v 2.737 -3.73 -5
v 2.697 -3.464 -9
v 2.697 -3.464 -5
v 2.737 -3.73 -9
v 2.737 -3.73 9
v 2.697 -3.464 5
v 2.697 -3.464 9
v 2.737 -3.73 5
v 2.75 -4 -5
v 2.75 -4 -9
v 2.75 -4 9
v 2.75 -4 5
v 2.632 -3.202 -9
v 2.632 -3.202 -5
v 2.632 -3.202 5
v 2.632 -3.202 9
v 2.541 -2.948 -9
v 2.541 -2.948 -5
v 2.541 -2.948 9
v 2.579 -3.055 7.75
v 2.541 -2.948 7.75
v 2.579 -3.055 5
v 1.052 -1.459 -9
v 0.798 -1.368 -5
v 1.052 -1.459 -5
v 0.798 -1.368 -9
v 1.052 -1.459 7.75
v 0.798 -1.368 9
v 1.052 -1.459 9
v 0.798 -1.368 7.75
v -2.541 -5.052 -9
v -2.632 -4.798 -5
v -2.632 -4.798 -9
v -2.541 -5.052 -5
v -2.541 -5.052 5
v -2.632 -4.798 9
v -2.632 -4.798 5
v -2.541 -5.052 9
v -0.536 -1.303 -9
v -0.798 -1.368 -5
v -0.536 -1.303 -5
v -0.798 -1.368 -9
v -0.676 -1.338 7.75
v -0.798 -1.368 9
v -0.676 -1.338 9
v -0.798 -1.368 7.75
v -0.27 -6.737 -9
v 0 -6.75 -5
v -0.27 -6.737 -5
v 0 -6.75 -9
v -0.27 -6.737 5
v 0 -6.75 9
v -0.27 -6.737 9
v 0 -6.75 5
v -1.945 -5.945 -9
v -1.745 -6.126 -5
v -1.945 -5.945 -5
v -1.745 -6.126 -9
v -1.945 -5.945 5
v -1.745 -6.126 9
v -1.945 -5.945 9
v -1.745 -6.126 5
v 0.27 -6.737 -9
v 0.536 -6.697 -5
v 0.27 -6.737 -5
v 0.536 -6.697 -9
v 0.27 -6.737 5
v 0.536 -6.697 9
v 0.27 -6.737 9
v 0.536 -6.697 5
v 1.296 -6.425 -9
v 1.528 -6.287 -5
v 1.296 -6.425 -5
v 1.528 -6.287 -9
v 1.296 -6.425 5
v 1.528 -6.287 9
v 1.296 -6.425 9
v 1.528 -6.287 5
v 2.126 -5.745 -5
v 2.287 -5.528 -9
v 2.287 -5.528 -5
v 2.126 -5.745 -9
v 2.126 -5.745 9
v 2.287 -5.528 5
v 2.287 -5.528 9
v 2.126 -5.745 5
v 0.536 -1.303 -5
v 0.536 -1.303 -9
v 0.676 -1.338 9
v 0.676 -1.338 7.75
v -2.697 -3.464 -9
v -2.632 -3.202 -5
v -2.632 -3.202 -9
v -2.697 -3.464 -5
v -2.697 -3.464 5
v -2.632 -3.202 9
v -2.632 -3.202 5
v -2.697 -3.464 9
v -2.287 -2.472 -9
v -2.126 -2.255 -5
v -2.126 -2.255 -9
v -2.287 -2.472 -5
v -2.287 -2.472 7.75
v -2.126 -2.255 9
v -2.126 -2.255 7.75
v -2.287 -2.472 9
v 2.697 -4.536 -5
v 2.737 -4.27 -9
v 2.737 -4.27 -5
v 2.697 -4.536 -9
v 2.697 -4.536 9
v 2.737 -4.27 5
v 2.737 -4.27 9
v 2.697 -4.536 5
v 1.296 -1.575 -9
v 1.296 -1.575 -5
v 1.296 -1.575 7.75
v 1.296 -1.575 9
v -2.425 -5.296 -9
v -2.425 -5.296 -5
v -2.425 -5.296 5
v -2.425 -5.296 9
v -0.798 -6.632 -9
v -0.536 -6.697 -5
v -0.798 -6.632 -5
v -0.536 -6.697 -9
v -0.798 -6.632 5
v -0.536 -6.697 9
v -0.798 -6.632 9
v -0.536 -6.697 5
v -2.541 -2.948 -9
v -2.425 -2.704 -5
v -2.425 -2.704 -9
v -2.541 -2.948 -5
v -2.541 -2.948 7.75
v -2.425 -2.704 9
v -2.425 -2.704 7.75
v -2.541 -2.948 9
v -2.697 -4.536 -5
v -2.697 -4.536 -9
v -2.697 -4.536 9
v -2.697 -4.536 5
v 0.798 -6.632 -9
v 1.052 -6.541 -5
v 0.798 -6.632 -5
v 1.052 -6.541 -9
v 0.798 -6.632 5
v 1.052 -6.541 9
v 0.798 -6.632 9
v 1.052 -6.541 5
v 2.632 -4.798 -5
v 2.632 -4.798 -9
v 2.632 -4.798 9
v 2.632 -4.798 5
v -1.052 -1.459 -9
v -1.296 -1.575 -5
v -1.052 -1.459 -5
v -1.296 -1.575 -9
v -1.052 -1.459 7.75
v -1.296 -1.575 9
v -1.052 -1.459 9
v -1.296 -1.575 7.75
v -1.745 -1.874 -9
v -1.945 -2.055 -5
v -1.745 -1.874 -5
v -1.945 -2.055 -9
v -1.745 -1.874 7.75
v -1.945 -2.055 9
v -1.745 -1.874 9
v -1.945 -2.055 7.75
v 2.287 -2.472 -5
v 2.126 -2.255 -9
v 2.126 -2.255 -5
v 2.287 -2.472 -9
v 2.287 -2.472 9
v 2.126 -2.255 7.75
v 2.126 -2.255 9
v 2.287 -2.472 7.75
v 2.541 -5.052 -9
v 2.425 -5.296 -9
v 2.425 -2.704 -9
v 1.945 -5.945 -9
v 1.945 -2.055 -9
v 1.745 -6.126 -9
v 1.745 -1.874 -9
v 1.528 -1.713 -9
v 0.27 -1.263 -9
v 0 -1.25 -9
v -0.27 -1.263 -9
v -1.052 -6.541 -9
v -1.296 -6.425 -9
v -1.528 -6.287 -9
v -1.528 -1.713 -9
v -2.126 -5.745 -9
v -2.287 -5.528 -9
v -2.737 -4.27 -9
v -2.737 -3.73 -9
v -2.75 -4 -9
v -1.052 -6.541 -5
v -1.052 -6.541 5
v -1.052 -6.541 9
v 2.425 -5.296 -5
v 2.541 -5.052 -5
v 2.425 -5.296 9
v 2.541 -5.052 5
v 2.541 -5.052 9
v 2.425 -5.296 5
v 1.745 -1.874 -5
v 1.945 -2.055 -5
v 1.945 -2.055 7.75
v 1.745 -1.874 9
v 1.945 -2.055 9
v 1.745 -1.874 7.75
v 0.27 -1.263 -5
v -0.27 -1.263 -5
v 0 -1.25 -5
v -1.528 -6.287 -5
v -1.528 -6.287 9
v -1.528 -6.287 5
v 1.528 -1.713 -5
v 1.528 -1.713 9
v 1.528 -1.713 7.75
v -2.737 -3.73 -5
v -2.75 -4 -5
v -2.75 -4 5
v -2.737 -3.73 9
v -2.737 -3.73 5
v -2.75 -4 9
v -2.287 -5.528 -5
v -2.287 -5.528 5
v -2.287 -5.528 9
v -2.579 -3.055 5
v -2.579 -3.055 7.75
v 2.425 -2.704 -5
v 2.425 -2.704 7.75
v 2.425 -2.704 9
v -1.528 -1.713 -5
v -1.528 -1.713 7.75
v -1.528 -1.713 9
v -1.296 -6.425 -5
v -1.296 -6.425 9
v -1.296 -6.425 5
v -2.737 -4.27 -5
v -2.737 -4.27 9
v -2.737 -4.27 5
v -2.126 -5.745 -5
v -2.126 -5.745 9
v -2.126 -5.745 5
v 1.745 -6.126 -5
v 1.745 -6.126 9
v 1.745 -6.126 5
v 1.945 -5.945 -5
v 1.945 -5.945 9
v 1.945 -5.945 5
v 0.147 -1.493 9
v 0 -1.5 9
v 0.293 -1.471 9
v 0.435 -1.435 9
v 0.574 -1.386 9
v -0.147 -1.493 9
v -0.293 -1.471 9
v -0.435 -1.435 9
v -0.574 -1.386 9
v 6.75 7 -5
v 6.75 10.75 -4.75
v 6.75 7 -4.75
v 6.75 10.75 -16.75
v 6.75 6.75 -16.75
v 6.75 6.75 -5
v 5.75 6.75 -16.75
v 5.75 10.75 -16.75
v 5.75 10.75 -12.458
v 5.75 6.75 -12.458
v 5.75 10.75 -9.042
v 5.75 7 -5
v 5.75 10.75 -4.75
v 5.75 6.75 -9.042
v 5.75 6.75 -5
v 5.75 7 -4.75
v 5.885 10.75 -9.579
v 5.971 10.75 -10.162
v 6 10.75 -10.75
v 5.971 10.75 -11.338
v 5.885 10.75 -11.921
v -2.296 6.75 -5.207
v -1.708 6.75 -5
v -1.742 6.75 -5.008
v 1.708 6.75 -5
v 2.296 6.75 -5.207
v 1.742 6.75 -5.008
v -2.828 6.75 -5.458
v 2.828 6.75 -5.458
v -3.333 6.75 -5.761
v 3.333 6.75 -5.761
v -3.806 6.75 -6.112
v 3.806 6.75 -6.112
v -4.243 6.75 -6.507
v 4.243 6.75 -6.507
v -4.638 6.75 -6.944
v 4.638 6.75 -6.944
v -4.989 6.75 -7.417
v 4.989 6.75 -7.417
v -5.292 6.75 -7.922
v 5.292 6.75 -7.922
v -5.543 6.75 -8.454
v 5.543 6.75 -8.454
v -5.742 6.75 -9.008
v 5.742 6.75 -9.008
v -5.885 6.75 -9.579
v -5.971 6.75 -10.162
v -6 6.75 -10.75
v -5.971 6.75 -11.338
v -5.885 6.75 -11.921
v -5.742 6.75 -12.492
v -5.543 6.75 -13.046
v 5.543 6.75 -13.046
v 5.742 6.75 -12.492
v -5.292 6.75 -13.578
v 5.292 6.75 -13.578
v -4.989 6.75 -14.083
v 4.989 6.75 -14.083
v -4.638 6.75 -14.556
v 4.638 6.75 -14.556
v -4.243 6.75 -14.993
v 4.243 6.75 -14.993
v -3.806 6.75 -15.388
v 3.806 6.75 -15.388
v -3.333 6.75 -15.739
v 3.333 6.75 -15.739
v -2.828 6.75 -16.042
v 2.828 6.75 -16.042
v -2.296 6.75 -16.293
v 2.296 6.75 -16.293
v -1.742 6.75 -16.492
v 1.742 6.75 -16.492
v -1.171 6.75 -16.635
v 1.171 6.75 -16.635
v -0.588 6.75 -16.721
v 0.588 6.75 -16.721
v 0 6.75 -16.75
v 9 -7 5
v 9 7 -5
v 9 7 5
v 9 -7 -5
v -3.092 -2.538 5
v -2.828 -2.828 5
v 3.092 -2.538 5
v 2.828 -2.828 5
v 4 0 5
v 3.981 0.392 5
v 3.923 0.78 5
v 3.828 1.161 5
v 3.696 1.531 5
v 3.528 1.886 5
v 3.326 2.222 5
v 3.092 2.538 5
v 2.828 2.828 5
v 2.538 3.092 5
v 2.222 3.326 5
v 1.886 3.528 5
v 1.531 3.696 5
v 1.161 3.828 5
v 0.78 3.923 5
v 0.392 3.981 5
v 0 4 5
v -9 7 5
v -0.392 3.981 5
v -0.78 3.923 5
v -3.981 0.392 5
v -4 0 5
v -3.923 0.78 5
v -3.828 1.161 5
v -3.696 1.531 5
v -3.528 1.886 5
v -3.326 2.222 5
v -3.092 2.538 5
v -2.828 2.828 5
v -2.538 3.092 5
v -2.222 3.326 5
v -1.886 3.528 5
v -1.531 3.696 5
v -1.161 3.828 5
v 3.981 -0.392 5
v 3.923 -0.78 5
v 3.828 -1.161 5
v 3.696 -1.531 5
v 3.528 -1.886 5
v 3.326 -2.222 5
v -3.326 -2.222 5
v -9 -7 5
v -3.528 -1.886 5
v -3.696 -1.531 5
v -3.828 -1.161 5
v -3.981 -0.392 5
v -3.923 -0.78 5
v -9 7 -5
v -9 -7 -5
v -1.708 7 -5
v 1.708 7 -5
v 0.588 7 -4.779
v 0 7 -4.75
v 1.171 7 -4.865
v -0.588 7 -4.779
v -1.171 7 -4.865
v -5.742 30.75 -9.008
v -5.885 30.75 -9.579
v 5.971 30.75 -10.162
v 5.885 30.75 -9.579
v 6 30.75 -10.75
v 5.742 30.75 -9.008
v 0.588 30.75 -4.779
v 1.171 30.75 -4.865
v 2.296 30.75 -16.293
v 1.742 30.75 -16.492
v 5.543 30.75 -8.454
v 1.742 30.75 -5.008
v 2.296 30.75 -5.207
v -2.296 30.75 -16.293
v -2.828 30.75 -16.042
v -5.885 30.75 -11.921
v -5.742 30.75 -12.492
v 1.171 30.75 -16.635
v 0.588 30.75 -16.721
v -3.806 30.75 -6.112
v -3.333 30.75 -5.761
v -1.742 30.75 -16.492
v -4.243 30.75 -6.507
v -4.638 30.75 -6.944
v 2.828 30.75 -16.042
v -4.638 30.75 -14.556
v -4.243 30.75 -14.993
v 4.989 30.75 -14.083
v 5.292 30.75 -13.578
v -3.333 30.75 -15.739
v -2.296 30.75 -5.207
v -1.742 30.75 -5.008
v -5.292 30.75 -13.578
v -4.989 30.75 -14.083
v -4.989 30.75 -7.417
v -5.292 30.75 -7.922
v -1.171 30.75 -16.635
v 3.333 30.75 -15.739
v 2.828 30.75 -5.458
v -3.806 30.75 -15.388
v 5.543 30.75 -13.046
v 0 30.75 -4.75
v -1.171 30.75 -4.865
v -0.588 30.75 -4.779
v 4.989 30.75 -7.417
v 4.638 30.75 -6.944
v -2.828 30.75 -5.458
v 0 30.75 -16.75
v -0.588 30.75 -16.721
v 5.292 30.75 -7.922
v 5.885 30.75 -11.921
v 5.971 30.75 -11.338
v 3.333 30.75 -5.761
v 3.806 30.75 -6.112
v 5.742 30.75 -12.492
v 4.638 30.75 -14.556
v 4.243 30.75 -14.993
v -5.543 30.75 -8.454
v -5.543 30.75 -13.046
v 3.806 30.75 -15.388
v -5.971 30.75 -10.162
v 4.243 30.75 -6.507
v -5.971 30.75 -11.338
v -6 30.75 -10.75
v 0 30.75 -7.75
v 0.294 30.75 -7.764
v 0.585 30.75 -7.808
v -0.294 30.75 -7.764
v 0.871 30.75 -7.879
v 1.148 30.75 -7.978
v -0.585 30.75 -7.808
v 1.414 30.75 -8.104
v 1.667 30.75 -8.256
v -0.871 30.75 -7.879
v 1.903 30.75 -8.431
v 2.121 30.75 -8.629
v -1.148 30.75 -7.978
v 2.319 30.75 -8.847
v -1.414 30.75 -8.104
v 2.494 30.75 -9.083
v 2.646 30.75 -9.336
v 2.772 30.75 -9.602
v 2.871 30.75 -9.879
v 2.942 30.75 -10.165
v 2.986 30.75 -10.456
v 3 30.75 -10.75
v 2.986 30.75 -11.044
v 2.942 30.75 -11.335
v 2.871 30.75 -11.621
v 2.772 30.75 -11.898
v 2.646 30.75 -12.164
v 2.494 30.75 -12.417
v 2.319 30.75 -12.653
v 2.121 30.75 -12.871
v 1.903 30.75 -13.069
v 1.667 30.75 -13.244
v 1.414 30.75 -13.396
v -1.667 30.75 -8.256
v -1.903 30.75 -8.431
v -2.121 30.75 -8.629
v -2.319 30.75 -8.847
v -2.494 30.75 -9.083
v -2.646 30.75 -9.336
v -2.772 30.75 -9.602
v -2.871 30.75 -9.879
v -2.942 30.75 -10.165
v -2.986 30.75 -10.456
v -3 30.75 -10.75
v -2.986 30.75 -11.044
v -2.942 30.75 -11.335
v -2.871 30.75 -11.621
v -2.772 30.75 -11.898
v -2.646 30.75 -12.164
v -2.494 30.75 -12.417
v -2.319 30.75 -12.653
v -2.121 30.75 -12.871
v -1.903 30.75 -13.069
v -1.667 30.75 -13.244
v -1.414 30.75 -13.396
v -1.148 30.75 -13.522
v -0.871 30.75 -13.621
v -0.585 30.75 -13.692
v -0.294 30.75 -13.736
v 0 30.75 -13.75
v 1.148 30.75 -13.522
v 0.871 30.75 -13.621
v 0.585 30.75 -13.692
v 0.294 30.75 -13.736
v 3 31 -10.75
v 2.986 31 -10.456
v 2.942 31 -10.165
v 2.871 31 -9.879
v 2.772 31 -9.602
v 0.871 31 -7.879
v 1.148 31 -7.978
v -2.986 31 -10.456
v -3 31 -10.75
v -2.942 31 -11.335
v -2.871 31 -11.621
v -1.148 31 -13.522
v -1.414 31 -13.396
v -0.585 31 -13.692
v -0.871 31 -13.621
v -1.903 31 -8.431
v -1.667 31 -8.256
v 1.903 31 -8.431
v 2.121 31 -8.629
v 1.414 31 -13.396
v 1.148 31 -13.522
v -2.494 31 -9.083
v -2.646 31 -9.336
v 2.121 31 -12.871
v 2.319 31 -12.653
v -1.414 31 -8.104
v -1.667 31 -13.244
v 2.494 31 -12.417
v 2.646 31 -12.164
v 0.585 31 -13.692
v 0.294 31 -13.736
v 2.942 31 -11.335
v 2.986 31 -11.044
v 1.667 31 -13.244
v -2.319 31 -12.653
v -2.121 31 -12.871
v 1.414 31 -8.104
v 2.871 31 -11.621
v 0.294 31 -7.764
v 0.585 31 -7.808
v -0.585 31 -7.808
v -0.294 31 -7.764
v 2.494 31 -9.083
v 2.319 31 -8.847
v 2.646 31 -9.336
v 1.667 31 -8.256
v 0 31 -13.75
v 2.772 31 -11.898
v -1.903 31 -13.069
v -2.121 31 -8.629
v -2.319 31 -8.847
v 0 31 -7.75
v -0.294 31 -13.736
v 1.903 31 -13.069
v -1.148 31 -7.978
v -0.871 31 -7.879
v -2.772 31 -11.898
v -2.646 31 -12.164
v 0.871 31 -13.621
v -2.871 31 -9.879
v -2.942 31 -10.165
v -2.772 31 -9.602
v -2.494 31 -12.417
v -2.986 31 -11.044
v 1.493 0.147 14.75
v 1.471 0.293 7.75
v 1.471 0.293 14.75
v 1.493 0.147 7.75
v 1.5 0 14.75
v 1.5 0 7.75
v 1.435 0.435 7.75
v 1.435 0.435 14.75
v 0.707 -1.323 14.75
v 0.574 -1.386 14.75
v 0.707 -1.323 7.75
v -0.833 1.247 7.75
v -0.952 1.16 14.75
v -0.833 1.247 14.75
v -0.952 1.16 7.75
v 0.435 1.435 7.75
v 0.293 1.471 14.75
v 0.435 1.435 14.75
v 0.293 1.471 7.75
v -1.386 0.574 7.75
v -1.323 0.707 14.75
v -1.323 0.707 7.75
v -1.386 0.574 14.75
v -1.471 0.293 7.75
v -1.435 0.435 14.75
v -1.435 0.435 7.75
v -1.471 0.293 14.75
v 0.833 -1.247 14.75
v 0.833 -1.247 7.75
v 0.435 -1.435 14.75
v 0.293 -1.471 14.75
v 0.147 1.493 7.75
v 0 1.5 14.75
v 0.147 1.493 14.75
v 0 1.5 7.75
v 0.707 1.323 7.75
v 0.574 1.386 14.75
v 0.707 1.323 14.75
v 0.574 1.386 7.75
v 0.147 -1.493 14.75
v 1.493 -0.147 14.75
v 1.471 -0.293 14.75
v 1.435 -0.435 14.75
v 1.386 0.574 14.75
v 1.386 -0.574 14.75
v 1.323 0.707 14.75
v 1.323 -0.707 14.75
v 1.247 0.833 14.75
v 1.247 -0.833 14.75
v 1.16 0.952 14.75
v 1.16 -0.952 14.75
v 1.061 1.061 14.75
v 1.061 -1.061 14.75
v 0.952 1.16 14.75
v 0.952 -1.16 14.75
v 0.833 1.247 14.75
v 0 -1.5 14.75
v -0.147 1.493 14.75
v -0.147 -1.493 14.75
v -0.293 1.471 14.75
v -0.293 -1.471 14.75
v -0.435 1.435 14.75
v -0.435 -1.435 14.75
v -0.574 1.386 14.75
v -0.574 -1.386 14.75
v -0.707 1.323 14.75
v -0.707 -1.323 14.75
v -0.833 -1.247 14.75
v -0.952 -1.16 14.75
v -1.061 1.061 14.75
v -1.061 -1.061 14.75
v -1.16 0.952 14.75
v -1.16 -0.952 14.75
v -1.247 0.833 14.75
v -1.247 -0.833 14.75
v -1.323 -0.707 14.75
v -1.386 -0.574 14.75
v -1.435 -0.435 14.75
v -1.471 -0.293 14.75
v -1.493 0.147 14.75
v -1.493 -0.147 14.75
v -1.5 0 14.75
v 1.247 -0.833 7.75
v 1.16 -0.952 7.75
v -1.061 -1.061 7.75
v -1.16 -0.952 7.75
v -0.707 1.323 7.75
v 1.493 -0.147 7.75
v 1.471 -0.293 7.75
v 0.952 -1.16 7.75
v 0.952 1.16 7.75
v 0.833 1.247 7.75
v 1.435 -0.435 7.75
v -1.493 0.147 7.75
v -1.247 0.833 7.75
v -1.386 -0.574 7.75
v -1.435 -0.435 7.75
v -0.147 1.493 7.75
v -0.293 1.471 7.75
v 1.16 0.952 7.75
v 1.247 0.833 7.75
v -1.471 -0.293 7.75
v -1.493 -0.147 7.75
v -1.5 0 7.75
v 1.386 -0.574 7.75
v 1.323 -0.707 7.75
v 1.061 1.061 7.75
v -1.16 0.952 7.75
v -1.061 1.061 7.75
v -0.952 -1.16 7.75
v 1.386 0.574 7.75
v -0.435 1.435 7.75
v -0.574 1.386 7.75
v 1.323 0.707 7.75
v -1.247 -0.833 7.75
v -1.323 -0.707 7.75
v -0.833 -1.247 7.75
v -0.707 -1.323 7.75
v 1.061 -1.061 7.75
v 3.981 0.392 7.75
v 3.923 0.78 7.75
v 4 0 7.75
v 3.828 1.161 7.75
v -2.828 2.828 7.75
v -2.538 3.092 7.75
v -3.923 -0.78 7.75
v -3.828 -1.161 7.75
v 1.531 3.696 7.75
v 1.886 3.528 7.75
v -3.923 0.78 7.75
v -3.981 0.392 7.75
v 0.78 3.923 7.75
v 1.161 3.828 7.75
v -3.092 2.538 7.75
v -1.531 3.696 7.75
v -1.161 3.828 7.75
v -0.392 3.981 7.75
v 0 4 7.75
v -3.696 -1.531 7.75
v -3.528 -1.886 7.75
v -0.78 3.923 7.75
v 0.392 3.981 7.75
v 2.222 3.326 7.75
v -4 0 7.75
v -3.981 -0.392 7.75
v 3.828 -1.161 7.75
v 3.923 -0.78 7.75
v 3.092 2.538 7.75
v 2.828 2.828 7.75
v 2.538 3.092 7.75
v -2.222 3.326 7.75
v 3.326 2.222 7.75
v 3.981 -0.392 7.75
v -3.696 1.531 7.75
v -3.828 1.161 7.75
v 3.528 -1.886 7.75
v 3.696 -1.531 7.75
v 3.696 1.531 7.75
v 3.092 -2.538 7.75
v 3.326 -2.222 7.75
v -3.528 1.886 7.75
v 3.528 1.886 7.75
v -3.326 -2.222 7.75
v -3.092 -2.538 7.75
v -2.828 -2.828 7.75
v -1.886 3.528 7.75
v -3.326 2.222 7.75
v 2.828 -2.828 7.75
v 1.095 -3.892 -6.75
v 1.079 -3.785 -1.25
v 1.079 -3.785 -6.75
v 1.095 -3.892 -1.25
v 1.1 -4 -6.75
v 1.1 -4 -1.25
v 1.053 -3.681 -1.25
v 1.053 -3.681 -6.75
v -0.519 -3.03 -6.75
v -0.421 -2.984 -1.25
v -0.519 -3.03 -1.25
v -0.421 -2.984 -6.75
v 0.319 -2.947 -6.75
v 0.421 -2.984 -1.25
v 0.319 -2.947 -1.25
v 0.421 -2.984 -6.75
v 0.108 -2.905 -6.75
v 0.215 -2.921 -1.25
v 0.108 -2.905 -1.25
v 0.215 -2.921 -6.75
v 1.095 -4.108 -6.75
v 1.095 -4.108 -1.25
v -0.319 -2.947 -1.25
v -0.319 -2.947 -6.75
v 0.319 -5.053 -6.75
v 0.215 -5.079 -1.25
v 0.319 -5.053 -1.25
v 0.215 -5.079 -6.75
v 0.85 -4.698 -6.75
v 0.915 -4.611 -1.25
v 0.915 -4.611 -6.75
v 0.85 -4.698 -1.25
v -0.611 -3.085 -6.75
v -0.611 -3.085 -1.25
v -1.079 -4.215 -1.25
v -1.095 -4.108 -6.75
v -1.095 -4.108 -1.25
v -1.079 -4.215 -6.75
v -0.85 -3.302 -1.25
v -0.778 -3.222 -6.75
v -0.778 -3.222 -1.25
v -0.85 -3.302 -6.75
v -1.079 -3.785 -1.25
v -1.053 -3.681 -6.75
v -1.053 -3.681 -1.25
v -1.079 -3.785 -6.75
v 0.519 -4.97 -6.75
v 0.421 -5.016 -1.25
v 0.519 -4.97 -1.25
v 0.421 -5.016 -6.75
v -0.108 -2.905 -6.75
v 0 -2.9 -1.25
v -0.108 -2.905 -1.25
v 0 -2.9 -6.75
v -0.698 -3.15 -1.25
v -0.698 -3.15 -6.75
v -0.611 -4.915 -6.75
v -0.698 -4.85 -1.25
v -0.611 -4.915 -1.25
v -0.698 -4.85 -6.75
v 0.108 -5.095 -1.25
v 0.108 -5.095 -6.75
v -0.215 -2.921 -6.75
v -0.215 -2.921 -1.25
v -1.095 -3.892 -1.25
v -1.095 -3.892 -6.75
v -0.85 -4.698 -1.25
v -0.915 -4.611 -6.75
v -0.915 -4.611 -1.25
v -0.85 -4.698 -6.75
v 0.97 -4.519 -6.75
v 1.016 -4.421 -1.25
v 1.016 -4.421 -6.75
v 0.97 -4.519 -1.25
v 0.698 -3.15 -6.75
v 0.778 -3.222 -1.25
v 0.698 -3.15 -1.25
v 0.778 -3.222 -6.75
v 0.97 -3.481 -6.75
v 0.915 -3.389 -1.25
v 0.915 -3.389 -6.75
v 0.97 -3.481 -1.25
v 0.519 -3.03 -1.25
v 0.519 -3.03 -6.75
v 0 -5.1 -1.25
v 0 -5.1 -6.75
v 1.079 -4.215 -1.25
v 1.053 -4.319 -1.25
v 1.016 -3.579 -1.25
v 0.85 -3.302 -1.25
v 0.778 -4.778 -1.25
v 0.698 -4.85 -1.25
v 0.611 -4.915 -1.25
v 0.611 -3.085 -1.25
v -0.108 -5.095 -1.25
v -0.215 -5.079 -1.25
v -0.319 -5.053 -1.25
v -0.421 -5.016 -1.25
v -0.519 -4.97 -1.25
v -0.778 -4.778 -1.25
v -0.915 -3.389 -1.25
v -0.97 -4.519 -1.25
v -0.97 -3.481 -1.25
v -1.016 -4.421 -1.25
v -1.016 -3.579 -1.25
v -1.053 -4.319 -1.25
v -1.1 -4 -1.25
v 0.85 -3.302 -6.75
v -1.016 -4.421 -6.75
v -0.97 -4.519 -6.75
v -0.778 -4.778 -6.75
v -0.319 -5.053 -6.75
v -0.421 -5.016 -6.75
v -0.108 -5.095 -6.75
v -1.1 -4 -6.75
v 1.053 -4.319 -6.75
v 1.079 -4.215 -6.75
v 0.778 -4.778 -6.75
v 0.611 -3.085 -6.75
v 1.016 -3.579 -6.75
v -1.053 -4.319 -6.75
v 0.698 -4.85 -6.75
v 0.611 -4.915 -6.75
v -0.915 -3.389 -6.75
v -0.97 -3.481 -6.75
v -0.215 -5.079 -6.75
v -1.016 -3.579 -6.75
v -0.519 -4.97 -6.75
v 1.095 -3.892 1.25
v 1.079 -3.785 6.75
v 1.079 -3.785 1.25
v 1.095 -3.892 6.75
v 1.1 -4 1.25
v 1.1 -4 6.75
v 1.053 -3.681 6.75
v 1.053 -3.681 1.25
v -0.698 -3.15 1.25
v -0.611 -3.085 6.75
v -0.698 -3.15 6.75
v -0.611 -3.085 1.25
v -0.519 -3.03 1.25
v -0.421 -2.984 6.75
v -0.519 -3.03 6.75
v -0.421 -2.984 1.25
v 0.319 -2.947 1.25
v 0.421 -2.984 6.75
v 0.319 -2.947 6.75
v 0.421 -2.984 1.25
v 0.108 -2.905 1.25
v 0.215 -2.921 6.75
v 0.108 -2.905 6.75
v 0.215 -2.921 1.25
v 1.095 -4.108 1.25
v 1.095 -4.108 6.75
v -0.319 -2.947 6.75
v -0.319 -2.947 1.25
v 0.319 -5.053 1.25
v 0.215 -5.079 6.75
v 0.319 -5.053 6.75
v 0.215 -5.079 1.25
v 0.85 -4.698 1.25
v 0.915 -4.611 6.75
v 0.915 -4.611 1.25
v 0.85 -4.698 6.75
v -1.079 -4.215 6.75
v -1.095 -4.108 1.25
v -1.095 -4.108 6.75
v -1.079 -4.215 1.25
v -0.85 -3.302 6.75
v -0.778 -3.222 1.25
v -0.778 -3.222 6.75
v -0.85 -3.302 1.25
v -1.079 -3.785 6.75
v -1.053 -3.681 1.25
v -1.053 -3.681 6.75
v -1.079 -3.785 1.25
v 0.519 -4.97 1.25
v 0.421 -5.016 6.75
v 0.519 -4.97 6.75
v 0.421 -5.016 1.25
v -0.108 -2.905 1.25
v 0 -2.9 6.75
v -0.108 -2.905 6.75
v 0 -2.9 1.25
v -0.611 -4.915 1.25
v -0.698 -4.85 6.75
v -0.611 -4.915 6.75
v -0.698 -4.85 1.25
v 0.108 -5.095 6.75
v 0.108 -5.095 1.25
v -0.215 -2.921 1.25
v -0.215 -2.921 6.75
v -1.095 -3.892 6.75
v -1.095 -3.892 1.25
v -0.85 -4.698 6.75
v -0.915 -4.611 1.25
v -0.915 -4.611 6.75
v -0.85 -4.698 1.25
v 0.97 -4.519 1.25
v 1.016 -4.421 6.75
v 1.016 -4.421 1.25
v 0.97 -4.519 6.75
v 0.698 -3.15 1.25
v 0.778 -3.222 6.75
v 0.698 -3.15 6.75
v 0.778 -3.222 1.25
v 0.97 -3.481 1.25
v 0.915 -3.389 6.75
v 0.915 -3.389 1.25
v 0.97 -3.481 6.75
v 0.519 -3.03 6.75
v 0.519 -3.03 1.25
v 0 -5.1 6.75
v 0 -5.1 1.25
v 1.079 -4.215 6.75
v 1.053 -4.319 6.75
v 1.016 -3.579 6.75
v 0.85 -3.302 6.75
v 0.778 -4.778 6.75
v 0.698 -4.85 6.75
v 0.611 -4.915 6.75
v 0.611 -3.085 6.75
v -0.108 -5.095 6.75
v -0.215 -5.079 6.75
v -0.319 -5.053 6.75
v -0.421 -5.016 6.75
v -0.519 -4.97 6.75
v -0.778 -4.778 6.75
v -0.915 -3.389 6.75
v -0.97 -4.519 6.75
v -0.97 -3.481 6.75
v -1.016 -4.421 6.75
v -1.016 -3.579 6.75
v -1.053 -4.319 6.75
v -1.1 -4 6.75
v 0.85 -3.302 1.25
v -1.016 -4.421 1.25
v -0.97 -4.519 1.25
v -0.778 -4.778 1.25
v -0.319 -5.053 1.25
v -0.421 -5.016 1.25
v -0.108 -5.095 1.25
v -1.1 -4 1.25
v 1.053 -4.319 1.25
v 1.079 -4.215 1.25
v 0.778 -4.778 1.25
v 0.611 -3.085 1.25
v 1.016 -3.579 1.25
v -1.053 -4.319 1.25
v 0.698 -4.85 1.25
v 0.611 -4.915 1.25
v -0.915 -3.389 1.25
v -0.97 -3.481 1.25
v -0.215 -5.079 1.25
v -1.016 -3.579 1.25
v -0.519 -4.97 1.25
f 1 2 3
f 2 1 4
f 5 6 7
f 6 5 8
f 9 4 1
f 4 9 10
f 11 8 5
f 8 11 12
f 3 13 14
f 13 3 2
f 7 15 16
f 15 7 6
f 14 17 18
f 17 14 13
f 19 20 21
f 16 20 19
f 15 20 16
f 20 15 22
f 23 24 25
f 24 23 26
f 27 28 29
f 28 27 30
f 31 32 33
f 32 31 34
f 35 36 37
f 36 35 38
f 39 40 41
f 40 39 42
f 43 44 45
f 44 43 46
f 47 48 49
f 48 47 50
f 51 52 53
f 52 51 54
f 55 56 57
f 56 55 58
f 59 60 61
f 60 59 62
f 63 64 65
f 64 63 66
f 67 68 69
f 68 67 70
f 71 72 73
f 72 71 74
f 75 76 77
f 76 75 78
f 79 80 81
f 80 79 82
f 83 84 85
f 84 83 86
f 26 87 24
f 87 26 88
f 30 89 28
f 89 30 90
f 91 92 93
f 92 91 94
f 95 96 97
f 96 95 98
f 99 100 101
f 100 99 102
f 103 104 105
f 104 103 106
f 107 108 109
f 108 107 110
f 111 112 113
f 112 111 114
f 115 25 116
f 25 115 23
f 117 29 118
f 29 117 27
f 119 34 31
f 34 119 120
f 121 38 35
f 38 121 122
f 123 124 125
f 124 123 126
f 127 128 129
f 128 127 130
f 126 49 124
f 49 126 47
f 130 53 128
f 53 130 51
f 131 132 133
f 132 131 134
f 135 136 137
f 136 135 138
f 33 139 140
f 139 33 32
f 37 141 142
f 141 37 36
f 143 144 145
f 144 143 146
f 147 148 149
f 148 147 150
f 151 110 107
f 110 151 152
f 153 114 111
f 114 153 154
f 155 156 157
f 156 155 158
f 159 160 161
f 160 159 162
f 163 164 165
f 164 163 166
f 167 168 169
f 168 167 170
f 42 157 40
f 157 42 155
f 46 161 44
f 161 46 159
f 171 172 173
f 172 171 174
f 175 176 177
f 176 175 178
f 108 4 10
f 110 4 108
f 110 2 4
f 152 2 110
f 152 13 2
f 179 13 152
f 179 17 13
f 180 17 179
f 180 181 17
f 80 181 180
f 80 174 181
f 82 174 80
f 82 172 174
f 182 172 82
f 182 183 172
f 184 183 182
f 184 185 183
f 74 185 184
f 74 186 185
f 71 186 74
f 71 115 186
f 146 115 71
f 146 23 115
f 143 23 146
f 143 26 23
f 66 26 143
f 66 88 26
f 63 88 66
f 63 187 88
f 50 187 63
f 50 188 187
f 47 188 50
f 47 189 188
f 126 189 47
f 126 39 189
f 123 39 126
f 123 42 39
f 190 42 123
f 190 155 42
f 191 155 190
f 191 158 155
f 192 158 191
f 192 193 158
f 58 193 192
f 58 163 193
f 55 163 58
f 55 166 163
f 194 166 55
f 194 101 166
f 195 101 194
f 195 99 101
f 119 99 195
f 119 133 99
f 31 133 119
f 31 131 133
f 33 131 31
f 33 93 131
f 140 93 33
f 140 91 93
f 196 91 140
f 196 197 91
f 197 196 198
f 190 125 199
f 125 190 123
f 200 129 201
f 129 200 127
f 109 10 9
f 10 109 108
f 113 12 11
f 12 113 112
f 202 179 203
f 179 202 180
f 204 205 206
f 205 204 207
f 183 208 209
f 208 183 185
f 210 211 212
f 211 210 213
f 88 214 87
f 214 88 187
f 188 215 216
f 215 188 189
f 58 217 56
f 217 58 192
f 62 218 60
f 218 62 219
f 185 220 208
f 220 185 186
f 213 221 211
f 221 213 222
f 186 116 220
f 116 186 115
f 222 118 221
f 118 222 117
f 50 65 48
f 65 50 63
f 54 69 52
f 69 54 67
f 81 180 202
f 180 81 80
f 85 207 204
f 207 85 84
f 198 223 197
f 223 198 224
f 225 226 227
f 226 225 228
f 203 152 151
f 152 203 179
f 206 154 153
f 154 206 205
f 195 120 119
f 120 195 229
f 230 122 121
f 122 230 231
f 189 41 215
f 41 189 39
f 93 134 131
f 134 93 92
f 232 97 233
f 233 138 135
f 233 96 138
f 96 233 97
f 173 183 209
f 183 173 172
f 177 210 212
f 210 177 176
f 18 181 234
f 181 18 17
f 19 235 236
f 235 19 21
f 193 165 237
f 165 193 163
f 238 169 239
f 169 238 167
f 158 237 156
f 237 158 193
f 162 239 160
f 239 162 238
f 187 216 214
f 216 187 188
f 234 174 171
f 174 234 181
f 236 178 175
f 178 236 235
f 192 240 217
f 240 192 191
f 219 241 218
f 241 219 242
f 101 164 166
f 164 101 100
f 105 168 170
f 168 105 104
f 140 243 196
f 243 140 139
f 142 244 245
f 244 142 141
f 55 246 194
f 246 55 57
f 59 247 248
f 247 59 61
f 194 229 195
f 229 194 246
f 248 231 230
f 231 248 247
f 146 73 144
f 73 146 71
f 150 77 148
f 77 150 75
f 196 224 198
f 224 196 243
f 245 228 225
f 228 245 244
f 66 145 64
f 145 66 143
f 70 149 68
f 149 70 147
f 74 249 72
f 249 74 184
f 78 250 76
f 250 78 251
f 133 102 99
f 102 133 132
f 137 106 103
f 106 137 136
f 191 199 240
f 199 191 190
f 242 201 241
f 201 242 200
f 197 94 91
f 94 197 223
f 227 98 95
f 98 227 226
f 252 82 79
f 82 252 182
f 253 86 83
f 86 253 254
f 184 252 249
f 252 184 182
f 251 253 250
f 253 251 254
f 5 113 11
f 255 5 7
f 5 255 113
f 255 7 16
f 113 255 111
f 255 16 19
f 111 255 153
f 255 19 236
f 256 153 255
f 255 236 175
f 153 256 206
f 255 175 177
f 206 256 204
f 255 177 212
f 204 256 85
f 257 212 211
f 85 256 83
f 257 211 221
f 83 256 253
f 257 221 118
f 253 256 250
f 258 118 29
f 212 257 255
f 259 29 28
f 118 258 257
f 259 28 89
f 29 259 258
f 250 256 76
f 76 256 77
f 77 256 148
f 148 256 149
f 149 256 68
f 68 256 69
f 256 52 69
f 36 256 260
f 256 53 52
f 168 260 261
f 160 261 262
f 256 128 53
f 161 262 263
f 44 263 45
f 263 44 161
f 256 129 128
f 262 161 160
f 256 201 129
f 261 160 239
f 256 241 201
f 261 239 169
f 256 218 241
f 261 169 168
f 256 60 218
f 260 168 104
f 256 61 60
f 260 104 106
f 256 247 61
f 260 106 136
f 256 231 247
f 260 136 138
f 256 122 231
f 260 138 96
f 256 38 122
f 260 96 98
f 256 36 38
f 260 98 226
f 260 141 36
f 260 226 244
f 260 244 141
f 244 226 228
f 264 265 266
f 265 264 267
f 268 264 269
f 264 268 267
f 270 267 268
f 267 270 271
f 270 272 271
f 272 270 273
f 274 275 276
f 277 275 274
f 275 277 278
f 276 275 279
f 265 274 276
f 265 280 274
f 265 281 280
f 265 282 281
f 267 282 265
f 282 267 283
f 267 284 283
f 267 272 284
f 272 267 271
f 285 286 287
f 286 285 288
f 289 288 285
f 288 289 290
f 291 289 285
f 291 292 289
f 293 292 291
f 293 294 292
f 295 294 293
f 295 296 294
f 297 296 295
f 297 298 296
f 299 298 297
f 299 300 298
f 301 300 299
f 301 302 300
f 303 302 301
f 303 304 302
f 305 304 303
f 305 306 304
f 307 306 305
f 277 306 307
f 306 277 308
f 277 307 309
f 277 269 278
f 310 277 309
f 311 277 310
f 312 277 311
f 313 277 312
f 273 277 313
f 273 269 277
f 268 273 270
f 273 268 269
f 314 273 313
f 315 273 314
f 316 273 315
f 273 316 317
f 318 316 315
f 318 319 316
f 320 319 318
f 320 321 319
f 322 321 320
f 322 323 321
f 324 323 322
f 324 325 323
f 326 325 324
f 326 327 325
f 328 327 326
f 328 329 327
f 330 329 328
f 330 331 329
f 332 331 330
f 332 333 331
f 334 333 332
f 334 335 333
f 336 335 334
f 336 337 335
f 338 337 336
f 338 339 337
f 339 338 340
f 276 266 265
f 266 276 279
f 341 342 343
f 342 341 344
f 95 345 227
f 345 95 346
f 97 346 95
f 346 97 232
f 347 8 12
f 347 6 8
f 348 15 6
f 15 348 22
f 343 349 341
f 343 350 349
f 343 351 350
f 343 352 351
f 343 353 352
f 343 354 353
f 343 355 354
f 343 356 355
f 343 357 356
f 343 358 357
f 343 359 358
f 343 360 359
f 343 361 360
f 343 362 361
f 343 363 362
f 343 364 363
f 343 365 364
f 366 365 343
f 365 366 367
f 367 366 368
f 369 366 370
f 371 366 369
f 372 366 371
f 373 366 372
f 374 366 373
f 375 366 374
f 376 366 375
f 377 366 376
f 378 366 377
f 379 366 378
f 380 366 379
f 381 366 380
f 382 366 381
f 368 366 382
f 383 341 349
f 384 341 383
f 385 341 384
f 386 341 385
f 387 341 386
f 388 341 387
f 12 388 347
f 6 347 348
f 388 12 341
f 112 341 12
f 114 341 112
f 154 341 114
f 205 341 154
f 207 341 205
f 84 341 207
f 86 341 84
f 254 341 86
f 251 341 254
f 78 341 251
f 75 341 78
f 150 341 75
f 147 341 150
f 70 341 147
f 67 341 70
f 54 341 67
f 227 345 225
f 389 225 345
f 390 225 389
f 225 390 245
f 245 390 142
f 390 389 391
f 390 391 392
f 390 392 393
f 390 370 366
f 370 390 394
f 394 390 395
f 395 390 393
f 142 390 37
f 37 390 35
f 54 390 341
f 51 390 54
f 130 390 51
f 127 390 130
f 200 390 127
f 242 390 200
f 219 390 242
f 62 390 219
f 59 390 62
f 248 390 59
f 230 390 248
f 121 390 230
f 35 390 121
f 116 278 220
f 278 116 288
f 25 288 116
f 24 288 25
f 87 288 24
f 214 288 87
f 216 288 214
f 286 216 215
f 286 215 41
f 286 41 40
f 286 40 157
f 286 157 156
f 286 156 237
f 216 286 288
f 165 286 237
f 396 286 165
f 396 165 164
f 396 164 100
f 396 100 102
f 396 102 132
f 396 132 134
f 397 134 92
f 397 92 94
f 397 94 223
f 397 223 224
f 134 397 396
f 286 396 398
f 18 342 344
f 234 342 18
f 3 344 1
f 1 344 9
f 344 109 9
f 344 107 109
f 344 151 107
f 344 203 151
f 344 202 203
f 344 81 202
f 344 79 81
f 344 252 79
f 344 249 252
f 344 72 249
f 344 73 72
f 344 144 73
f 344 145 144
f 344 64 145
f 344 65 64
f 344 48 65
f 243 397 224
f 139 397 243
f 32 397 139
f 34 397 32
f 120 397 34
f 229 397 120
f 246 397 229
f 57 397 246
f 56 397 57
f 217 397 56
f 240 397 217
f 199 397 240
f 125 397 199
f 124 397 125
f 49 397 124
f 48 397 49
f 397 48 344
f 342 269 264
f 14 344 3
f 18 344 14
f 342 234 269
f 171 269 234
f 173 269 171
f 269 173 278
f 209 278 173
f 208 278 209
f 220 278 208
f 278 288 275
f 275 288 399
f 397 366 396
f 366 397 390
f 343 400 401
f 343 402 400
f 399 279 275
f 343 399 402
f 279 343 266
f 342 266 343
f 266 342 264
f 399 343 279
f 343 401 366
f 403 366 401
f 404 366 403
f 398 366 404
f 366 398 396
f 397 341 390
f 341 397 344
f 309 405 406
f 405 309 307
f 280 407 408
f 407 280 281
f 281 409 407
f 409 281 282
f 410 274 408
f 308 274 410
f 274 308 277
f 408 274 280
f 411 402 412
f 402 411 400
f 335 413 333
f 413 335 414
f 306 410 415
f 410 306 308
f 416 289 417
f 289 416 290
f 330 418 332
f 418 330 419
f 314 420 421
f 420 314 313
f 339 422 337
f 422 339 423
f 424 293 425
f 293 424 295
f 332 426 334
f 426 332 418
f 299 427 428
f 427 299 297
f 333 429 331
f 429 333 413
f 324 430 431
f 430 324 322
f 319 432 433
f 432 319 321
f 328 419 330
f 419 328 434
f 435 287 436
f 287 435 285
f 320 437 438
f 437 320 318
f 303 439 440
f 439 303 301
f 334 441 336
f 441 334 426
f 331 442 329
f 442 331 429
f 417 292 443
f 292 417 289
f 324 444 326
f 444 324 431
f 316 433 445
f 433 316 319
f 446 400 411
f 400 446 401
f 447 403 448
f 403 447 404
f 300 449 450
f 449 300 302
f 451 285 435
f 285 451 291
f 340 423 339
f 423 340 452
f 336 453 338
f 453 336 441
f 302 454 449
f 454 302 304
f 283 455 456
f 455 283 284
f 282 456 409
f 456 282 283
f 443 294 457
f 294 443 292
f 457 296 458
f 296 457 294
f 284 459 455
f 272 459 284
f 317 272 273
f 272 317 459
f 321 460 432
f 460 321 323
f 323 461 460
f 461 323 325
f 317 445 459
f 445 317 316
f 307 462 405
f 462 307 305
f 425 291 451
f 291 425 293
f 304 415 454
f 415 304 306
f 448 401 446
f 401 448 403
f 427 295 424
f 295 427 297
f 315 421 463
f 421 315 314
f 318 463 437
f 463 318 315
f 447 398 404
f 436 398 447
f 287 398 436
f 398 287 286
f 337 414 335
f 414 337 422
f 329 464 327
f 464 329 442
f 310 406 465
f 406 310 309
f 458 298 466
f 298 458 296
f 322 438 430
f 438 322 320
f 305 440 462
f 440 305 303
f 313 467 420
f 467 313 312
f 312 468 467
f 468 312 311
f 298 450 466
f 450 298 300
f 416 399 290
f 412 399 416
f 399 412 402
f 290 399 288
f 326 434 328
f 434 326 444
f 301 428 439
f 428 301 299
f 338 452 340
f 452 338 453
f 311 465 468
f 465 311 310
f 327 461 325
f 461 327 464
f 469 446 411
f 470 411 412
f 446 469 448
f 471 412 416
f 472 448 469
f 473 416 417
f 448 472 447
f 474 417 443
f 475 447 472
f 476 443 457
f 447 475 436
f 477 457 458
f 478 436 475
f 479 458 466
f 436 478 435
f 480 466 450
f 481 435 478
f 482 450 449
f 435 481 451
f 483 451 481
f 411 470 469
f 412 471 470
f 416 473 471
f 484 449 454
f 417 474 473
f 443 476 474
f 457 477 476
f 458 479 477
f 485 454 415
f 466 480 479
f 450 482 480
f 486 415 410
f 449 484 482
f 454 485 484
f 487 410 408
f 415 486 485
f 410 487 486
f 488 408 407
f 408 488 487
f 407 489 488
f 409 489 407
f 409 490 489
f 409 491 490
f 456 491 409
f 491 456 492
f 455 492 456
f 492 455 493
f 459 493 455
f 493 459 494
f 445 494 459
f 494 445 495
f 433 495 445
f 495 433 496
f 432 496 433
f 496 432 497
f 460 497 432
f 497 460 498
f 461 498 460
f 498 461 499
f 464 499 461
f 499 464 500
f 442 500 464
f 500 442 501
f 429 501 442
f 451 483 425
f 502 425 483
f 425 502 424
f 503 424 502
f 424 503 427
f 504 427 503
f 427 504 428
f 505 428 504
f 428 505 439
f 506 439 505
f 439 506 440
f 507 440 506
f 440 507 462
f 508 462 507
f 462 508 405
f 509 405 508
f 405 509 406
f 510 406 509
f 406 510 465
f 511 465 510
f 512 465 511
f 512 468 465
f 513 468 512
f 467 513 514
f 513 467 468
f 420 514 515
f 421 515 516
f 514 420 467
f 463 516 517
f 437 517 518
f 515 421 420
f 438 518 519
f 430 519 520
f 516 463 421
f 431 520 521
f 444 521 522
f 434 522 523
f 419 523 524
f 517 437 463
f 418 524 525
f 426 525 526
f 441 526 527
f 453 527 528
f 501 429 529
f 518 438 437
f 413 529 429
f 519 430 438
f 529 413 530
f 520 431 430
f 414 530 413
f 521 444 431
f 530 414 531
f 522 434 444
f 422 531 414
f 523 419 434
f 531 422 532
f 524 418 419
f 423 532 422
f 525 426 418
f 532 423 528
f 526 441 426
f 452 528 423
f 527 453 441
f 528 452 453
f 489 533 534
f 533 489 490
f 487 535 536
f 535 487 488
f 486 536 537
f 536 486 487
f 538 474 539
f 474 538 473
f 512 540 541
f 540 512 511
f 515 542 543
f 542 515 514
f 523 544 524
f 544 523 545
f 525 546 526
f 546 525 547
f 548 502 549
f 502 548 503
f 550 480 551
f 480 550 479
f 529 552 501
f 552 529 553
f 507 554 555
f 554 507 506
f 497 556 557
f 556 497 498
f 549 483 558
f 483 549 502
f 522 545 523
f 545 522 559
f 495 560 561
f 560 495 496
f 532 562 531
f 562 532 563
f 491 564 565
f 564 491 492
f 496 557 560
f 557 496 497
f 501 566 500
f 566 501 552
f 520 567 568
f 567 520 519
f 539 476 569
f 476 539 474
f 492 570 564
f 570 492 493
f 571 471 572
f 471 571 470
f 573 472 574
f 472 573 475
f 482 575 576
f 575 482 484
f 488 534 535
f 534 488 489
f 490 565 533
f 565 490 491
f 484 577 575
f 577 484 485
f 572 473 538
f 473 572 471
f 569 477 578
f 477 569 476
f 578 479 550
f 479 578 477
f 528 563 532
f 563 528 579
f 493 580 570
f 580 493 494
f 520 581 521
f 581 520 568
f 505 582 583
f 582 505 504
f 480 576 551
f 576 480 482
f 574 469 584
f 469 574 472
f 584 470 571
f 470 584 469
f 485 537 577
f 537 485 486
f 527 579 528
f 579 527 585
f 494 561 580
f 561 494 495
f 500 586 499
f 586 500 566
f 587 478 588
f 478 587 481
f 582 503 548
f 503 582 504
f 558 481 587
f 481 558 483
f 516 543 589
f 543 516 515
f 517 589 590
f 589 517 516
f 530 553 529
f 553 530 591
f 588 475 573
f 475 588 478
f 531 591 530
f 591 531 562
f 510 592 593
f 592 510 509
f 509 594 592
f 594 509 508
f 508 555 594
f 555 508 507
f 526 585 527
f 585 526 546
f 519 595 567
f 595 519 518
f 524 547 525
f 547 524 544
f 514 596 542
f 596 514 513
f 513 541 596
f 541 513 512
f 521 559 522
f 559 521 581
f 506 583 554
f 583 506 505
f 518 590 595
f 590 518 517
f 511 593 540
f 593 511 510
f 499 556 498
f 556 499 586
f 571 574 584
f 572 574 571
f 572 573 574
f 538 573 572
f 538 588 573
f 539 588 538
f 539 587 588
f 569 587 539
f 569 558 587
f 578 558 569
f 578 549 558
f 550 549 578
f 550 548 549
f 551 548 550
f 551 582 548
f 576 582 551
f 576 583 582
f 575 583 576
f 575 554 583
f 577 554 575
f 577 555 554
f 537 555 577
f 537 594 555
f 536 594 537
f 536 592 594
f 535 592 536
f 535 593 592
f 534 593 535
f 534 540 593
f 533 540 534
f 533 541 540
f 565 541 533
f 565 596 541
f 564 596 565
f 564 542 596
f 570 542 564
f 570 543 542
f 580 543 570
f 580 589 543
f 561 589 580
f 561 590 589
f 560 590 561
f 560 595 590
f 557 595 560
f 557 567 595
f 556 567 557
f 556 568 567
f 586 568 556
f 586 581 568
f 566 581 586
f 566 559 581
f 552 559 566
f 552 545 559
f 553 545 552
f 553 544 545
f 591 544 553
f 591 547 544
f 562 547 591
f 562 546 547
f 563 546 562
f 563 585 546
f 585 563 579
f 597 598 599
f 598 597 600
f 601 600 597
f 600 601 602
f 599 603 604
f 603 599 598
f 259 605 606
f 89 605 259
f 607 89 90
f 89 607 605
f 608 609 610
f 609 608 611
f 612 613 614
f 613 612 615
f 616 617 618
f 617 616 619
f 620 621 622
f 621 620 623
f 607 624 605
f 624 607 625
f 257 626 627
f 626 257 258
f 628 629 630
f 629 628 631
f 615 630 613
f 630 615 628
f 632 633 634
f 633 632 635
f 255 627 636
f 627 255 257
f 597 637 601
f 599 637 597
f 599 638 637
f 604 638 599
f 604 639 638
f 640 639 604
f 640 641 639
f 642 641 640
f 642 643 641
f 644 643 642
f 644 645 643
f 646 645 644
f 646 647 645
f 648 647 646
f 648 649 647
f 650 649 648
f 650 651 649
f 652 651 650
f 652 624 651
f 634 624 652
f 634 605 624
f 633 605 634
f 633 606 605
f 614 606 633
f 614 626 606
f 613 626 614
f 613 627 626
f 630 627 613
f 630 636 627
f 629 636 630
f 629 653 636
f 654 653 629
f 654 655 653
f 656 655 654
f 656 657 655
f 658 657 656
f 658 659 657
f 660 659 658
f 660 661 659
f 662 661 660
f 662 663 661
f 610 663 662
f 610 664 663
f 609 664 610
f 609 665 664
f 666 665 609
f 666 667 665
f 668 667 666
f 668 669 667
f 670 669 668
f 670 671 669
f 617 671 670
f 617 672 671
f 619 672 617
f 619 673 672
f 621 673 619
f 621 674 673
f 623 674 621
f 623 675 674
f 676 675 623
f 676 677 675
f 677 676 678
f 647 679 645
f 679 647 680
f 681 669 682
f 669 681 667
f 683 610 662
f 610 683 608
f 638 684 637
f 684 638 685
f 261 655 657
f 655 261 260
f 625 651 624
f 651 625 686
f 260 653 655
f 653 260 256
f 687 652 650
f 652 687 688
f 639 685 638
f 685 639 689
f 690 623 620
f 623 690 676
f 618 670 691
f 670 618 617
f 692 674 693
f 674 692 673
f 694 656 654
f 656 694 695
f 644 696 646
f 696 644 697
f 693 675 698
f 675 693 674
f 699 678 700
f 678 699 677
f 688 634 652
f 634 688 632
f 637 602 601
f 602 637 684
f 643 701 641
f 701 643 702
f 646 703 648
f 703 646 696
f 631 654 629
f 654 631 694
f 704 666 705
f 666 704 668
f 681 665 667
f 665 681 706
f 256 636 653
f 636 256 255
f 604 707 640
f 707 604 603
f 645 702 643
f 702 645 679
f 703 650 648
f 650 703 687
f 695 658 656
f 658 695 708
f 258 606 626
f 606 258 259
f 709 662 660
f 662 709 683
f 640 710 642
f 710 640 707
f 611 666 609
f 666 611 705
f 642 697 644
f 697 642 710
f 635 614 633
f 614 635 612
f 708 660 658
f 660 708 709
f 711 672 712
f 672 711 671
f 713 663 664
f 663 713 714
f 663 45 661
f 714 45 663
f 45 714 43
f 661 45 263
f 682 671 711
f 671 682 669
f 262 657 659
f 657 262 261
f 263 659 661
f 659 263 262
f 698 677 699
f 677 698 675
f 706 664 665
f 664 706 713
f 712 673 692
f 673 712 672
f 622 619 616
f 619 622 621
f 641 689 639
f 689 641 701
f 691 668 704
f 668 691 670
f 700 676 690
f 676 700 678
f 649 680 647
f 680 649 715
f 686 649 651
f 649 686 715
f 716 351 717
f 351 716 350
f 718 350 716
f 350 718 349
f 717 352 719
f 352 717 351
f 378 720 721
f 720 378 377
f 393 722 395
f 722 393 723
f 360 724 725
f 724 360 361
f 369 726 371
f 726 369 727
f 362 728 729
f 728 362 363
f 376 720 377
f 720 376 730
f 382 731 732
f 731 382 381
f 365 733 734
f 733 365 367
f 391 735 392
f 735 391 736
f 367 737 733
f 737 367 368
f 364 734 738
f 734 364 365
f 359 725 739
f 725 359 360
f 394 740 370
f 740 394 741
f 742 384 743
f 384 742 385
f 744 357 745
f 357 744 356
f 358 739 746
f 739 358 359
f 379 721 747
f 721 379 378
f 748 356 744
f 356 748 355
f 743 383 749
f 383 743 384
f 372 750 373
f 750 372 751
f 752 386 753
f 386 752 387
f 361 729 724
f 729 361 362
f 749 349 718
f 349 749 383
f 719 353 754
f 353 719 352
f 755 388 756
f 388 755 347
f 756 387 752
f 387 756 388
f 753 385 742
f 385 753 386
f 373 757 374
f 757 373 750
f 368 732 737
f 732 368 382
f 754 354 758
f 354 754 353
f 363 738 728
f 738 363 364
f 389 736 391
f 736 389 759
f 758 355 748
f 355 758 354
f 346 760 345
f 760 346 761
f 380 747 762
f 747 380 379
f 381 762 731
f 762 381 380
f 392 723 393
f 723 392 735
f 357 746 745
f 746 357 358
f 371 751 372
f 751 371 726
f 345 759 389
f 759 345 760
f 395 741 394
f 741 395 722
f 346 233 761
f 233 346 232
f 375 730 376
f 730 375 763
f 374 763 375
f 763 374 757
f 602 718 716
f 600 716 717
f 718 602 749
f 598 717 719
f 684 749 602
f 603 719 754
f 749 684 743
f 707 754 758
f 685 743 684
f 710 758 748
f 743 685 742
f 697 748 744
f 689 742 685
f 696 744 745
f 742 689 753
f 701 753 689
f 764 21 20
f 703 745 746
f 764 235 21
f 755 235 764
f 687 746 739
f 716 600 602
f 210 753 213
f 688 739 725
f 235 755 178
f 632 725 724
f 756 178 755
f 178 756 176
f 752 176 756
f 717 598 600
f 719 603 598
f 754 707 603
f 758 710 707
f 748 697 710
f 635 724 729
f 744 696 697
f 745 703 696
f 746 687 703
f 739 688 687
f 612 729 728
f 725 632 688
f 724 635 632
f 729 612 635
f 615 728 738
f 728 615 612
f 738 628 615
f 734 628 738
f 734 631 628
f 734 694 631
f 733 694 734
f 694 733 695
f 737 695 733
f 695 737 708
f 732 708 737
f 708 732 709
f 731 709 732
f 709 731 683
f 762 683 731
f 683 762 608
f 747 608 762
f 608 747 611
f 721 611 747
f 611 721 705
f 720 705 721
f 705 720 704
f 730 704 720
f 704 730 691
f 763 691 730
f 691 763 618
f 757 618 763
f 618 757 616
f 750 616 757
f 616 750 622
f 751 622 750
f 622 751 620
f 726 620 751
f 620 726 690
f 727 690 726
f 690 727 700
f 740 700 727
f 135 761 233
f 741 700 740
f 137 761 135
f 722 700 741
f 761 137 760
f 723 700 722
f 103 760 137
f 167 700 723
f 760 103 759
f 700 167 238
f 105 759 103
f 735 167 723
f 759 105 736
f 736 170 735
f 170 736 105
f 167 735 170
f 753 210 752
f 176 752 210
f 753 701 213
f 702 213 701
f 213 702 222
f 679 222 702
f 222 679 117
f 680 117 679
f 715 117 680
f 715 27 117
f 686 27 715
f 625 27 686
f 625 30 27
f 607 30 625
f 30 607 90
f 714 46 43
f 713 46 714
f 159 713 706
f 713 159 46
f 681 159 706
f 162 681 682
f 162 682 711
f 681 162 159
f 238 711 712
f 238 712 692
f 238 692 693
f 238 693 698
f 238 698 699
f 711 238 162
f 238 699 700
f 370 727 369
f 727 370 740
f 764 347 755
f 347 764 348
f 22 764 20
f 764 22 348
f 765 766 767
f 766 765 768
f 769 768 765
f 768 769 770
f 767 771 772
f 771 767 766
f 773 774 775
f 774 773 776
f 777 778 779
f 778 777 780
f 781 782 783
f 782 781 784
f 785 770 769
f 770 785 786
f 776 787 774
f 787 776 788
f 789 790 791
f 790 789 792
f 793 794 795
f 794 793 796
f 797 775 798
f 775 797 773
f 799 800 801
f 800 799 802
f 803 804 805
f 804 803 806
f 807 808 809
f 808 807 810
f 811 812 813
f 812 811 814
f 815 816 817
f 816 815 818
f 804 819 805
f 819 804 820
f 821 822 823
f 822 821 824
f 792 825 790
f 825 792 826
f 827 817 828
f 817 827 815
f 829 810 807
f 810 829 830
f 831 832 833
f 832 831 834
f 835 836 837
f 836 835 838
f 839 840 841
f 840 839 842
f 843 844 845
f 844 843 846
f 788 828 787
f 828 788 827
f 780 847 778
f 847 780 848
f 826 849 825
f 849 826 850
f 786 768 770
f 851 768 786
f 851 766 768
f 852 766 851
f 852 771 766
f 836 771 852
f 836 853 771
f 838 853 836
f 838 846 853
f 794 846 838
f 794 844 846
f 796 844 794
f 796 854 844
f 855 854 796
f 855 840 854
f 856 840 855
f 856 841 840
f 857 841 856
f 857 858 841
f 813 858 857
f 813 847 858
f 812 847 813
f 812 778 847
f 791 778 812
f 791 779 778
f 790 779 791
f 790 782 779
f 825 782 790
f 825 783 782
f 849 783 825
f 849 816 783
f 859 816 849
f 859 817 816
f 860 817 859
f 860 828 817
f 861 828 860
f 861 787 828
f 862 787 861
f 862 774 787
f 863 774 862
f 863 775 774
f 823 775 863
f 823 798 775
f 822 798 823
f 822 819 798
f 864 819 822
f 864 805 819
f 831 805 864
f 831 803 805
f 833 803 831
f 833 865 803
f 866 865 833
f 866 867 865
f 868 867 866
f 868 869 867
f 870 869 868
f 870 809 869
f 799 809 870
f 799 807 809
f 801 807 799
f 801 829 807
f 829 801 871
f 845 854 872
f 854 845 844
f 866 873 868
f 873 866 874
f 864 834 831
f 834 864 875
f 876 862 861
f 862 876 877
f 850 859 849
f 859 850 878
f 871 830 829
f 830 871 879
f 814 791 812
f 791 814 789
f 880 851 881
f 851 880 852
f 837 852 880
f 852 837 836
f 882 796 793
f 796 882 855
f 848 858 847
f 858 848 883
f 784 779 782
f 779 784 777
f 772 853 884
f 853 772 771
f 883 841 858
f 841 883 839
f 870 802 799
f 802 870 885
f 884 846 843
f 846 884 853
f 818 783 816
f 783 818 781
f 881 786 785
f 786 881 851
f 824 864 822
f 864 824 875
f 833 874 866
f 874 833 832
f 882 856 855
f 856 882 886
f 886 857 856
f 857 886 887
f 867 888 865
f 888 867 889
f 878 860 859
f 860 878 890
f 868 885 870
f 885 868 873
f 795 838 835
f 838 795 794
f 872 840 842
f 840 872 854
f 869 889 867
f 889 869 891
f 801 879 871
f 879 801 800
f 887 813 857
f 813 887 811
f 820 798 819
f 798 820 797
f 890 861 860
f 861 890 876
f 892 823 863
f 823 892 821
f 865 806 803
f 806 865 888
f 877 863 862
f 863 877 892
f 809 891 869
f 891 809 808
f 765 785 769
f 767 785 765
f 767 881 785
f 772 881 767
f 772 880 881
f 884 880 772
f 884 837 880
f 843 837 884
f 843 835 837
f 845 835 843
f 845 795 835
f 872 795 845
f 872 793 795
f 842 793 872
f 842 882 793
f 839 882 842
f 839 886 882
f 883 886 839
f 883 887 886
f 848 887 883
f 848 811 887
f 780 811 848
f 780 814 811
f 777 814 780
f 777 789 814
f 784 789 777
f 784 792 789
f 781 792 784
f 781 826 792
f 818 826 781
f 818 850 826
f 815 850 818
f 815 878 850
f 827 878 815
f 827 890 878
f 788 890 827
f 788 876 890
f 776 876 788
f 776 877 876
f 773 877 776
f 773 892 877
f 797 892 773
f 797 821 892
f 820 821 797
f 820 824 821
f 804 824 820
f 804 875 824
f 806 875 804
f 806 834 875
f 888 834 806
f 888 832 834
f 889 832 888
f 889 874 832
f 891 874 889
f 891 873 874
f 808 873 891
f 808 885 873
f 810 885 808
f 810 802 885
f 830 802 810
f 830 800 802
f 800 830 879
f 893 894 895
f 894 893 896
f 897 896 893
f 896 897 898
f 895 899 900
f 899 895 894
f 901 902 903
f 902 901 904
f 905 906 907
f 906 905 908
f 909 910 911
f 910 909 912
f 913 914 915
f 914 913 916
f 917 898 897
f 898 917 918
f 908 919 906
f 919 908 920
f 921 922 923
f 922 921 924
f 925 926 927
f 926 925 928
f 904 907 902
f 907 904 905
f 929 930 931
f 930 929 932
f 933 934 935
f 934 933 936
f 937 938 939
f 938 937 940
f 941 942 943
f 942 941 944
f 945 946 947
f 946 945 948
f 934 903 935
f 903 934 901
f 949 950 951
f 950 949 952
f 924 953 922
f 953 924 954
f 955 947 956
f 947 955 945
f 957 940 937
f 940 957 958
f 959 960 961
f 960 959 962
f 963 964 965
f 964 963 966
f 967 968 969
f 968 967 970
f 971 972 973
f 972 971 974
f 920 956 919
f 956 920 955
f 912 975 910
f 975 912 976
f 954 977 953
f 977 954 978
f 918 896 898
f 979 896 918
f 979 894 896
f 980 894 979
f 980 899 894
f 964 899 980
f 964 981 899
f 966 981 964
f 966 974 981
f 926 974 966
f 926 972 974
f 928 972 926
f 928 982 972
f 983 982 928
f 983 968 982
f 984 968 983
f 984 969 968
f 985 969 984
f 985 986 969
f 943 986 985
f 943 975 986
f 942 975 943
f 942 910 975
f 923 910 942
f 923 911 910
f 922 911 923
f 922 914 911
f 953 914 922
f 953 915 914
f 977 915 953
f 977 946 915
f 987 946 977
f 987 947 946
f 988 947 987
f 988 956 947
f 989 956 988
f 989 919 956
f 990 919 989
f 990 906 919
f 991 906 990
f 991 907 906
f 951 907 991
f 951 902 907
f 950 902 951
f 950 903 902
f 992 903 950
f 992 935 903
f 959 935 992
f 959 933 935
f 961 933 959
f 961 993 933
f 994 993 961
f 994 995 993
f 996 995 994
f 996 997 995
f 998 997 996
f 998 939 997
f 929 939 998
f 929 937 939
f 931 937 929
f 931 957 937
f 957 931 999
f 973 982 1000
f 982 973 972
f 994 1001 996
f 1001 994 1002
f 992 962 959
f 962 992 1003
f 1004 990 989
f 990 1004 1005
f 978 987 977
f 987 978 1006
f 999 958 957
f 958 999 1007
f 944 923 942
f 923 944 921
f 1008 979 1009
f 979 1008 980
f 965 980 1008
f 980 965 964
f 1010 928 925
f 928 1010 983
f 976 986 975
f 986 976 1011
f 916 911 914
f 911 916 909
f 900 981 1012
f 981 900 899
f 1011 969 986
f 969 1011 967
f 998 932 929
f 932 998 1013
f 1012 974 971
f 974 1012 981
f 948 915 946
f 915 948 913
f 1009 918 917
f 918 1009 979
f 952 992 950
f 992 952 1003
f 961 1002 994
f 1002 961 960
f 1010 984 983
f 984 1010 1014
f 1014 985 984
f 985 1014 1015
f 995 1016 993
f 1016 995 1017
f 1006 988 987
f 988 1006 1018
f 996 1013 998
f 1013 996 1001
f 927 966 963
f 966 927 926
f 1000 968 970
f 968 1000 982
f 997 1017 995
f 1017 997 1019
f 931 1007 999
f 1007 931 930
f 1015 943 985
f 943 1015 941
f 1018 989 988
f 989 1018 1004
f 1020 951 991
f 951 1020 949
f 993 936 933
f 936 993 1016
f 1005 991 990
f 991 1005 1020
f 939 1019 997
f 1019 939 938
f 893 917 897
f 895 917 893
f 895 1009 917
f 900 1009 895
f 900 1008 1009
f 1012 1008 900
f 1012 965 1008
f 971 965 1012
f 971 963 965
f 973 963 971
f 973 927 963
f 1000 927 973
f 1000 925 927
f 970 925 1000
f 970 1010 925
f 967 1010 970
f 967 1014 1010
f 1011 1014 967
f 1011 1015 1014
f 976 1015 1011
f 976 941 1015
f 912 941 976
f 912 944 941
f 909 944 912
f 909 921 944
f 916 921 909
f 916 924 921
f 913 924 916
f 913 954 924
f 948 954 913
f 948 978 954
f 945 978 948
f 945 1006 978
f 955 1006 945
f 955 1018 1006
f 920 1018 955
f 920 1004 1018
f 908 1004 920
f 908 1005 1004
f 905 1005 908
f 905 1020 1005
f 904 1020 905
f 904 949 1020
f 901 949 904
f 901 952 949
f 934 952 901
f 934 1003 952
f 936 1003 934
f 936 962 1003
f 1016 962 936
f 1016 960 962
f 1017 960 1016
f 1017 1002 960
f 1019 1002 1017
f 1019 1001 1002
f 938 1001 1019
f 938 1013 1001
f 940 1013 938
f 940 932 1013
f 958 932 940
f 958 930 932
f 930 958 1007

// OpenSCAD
// Parameters (kept; type_v* provided by prompt)
type_v0 = 6;   //[3:12:0.1]
type_v1 = 5.5; //[2.75:11:0.1]
type_v2 = 14.7;//[7.35:29.4:0.1]
type_v3 = 12;  //[6:24:0.1]

alpha = 1; //[0.1:1:0.05]
eps = 0.8; //[0.2:2:0.1]

// Core dimensions
shaft_d = 3; //[1.5:6:0.1]
shaft_len = 10; //[5:20:0.1]
shaft_boss_d = 8; //[4:16:0.1]
shaft_boss_h = 3; //[1.5:6:0.1]

gearbox_w = 18; //[9:36:0.1]
gearbox_d = 14; //[7:28:0.1]
gearbox_h = 10; //[5:20:0.1]

motor_d = 12; //[6:24:0.1]
motor_len = 24; //[12:48:0.1]
motor_offset_x = 6; //[0:12:0.1]

hub_d = 6; //[3:12:0.1]
hub_h = 2; //[1:4:0.1]

screw_hole_d = 2.2; //[1.2:4.4:0.1]
screw_boss_d = 5.5; //[3:11:0.1]
screw_boss_extra_h = 2; //[1:4:0.1]
screw_spacing_x = 12; //[6:24:0.1]
screw_spacing_y = 8; //[4:16:0.1]

tag_w = 4; //[2:8:0.1]
tag_h = 6; //[3:12:0.1]
tag_t = 1; //[0.5:2:0.1]
tag_spacing = 6; //[3:12:0.1]

$fn = 64;

// Gear Motor - ONE connected solid
module gear_motor() {
  ov = max(0.25, eps*0.25);

  // Place motor axis along +Y (matches reference: motor "down" in left/right views)
  // Motor is attached to gearbox on its +Y face, centered in X.
  motor_cy = gearbox_d/2 - ov + motor_len/2;
  motor_cx = 0;
  motor_cz = -gearbox_h/2 - motor_d/2 + ov; // slightly below gearbox

  // Hub at motor far end (+Y), overlapping into motor
  hub_cy = motor_cy + motor_len/2 - hub_h/2 + ov;

  // Top shaft and boss on gearbox top (+Z)
  shaft_cz = gearbox_h/2 + shaft_len/2 - ov;
  boss_cz  = gearbox_h/2 + shaft_boss_h/2 - ov;

  // Screw bosses: two posts on one face (as in reference), on -Y face of gearbox
  // Ensure they connect by overlapping into gearbox by ov.
  boss_h = gearbox_h; // posts run full height for a solid, connected look
  screw_post_cy = -gearbox_d/2 + ov + screw_boss_d/2; // tangent to -Y face with overlap
  screw_post_cz = 0;

  // Electrical tags: small tabs on motor can near gearbox end, on +X side
  tag_cy = motor_cy - motor_len/2 + tag_w/2; // near gearbox end of motor
  tag_cx = motor_d/2 - ov + tag_t/2;         // attached to motor side
  tag_cz = motor_cz;

  difference() {
    union() {
      // Gearbox body
      cube([gearbox_w, gearbox_d, gearbox_h], center=true);

      // Motor can (axis along Y)
      translate([motor_cx, motor_cy, motor_cz])
        rotate([90, 0, 0])
          cylinder(r=motor_d/2, h=motor_len, center=true);

      // Motor hub (small cylinder at far end)
      translate([motor_cx, hub_cy, motor_cz])
        rotate([90, 0, 0])
          cylinder(r=hub_d/2, h=hub_h, center=true);

      // Output shaft (top)
      translate([0, 0, shaft_cz])
        cylinder(r=shaft_d/2, h=shaft_len, center=true);

      // Shaft boss (top)
      translate([0, 0, boss_cz])
        cylinder(r=shaft_boss_d/2, h=shaft_boss_h, center=true);

      // Two screw posts on -Y face (top/bottom in Z)
      for (z = [-screw_spacing_y/2, screw_spacing_y/2])
        translate([0, screw_post_cy, z])
          cylinder(r=screw_boss_d/2, h=boss_h, center=true);

      // Electrical tags (two)
      for (sz = [-tag_spacing/2, tag_spacing/2])
        translate([tag_cx, tag_cy, tag_cz + sz])
          cube([tag_t, tag_w, tag_h], center=true);
    }

    // Shallow dimples on the two posts (do not cut through gearbox)
    dimple_h = screw_boss_d; // shallow
    for (z = [-screw_spacing_y/2, screw_spacing_y/2])
      translate([0, screw_post_cy, z])
        cylinder(r=screw_hole_d/2, h=dimple_h, center=true);
  }
}

gear_motor();
